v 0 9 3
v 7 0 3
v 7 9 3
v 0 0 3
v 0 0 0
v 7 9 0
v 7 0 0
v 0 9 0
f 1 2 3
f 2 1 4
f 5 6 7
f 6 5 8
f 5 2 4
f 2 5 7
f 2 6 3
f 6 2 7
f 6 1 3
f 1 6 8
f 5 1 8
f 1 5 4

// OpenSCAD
// Generated by SolidPython 1.0.1 on 2020-07-29 00:46:55


cube(size = [7, 9, 3]);
/***********************************************
*********      SolidPython code:      **********
************************************************
 
# import packages: SolidPython
from solid import *
from solid.utils import *
from itertools import chain, combinations, permutations


class Resize:

    def __init__(self, scad_file):
        self.scad_file = scad_file
        #self.scad_file = import_scad(scad_file)
        # cone/cylinder param:
        self.r1 = 0
        self.r2 = 0
        self.h = 0
        # rectangular prism param:
        self.w = 0
        self.l = 0
        # ellipse param:
        self.r = 0

    # import OpenScad code (file name corresponds to shape)


    # classify shape + parameters
    def assign(self, param1, param2, param3):
        if self.scad_file == 'cone.scad':
            self.r1 = param1
            self.r2 = param2
            self.h = param3
        elif self.scad_file == 'cylinder.scad':
            self.r1 = param1
            self.r2 = param2
            self.h = param3
        elif self.scad_file == 'rectangularPrism.scad':
            self.h = param1
            self.l = param2
            self.w = param3
        else:
            self.r = param1
            self.h = param2

    # resize parameters
    def iterate(self):
        x = range(3, 20, 2)
        i = 1
        if self.scad_file == 'cone.scad':
            tempList = list(permutations(x, 2))
            for temp in tempList:
                param1 = temp[0]
                param2 = temp[1]
                filepath = 'produced_scad_files/' + 'cone' + str(param1) + '_' + str(param2) + '_' + '.scad'
                scad_render_to_file(cylinder(h=param1, r1=param2, r2=0), filepath)

        elif self.scad_file == 'cylinder.scad':
            tempList = list(permutations(x, 3))
            for temp in tempList:
                param1 = temp[0]
                param2 = temp[1]
                filepath = 'produced_scad_files/' + 'cylinder' + str(param1) + '_' + str(param2) + '_' + '.scad'
                scad_render_to_file(cylinder(h=param1, r1=param2, r2=param2), filepath)

        elif self.scad_file == 'rectangularPrism.scad':
            tempList = list(permutations(x, 3))
            for temp in tempList:
                param1 = temp[0]
                param2 = temp[1]
                param3 = temp[2]
                filepath = 'produced_scad_files/' + 'rectangularPrism' + str(param1) + '_' + str(param2) + '_' + str(
                    param3) + '.scad'
                scad_render_to_file(cube(size=(param1, param2, param3)), filepath)

        elif self.scad_file == 'ellipse.scad':
            tempList = list(permutations(x, 4))
            for temp in tempList:
                param1 = temp[0]
                param2 = temp[1]
                param3 = temp[2]
                param4 = temp[3]
                filepath = 'produced_scad_files/' + 'ellipse' + str(param1) + '_' + str(param2) + '_' + str(param3) + '_' + str(param4) + '.scad'
                scad_render_to_file(scale([param1, param2, param3])(sphere(r=param4)), filepath)

    def render_to_scadfile(self):
        scad_render_to_file(scad, 'example.scad') 
 
************************************************/
